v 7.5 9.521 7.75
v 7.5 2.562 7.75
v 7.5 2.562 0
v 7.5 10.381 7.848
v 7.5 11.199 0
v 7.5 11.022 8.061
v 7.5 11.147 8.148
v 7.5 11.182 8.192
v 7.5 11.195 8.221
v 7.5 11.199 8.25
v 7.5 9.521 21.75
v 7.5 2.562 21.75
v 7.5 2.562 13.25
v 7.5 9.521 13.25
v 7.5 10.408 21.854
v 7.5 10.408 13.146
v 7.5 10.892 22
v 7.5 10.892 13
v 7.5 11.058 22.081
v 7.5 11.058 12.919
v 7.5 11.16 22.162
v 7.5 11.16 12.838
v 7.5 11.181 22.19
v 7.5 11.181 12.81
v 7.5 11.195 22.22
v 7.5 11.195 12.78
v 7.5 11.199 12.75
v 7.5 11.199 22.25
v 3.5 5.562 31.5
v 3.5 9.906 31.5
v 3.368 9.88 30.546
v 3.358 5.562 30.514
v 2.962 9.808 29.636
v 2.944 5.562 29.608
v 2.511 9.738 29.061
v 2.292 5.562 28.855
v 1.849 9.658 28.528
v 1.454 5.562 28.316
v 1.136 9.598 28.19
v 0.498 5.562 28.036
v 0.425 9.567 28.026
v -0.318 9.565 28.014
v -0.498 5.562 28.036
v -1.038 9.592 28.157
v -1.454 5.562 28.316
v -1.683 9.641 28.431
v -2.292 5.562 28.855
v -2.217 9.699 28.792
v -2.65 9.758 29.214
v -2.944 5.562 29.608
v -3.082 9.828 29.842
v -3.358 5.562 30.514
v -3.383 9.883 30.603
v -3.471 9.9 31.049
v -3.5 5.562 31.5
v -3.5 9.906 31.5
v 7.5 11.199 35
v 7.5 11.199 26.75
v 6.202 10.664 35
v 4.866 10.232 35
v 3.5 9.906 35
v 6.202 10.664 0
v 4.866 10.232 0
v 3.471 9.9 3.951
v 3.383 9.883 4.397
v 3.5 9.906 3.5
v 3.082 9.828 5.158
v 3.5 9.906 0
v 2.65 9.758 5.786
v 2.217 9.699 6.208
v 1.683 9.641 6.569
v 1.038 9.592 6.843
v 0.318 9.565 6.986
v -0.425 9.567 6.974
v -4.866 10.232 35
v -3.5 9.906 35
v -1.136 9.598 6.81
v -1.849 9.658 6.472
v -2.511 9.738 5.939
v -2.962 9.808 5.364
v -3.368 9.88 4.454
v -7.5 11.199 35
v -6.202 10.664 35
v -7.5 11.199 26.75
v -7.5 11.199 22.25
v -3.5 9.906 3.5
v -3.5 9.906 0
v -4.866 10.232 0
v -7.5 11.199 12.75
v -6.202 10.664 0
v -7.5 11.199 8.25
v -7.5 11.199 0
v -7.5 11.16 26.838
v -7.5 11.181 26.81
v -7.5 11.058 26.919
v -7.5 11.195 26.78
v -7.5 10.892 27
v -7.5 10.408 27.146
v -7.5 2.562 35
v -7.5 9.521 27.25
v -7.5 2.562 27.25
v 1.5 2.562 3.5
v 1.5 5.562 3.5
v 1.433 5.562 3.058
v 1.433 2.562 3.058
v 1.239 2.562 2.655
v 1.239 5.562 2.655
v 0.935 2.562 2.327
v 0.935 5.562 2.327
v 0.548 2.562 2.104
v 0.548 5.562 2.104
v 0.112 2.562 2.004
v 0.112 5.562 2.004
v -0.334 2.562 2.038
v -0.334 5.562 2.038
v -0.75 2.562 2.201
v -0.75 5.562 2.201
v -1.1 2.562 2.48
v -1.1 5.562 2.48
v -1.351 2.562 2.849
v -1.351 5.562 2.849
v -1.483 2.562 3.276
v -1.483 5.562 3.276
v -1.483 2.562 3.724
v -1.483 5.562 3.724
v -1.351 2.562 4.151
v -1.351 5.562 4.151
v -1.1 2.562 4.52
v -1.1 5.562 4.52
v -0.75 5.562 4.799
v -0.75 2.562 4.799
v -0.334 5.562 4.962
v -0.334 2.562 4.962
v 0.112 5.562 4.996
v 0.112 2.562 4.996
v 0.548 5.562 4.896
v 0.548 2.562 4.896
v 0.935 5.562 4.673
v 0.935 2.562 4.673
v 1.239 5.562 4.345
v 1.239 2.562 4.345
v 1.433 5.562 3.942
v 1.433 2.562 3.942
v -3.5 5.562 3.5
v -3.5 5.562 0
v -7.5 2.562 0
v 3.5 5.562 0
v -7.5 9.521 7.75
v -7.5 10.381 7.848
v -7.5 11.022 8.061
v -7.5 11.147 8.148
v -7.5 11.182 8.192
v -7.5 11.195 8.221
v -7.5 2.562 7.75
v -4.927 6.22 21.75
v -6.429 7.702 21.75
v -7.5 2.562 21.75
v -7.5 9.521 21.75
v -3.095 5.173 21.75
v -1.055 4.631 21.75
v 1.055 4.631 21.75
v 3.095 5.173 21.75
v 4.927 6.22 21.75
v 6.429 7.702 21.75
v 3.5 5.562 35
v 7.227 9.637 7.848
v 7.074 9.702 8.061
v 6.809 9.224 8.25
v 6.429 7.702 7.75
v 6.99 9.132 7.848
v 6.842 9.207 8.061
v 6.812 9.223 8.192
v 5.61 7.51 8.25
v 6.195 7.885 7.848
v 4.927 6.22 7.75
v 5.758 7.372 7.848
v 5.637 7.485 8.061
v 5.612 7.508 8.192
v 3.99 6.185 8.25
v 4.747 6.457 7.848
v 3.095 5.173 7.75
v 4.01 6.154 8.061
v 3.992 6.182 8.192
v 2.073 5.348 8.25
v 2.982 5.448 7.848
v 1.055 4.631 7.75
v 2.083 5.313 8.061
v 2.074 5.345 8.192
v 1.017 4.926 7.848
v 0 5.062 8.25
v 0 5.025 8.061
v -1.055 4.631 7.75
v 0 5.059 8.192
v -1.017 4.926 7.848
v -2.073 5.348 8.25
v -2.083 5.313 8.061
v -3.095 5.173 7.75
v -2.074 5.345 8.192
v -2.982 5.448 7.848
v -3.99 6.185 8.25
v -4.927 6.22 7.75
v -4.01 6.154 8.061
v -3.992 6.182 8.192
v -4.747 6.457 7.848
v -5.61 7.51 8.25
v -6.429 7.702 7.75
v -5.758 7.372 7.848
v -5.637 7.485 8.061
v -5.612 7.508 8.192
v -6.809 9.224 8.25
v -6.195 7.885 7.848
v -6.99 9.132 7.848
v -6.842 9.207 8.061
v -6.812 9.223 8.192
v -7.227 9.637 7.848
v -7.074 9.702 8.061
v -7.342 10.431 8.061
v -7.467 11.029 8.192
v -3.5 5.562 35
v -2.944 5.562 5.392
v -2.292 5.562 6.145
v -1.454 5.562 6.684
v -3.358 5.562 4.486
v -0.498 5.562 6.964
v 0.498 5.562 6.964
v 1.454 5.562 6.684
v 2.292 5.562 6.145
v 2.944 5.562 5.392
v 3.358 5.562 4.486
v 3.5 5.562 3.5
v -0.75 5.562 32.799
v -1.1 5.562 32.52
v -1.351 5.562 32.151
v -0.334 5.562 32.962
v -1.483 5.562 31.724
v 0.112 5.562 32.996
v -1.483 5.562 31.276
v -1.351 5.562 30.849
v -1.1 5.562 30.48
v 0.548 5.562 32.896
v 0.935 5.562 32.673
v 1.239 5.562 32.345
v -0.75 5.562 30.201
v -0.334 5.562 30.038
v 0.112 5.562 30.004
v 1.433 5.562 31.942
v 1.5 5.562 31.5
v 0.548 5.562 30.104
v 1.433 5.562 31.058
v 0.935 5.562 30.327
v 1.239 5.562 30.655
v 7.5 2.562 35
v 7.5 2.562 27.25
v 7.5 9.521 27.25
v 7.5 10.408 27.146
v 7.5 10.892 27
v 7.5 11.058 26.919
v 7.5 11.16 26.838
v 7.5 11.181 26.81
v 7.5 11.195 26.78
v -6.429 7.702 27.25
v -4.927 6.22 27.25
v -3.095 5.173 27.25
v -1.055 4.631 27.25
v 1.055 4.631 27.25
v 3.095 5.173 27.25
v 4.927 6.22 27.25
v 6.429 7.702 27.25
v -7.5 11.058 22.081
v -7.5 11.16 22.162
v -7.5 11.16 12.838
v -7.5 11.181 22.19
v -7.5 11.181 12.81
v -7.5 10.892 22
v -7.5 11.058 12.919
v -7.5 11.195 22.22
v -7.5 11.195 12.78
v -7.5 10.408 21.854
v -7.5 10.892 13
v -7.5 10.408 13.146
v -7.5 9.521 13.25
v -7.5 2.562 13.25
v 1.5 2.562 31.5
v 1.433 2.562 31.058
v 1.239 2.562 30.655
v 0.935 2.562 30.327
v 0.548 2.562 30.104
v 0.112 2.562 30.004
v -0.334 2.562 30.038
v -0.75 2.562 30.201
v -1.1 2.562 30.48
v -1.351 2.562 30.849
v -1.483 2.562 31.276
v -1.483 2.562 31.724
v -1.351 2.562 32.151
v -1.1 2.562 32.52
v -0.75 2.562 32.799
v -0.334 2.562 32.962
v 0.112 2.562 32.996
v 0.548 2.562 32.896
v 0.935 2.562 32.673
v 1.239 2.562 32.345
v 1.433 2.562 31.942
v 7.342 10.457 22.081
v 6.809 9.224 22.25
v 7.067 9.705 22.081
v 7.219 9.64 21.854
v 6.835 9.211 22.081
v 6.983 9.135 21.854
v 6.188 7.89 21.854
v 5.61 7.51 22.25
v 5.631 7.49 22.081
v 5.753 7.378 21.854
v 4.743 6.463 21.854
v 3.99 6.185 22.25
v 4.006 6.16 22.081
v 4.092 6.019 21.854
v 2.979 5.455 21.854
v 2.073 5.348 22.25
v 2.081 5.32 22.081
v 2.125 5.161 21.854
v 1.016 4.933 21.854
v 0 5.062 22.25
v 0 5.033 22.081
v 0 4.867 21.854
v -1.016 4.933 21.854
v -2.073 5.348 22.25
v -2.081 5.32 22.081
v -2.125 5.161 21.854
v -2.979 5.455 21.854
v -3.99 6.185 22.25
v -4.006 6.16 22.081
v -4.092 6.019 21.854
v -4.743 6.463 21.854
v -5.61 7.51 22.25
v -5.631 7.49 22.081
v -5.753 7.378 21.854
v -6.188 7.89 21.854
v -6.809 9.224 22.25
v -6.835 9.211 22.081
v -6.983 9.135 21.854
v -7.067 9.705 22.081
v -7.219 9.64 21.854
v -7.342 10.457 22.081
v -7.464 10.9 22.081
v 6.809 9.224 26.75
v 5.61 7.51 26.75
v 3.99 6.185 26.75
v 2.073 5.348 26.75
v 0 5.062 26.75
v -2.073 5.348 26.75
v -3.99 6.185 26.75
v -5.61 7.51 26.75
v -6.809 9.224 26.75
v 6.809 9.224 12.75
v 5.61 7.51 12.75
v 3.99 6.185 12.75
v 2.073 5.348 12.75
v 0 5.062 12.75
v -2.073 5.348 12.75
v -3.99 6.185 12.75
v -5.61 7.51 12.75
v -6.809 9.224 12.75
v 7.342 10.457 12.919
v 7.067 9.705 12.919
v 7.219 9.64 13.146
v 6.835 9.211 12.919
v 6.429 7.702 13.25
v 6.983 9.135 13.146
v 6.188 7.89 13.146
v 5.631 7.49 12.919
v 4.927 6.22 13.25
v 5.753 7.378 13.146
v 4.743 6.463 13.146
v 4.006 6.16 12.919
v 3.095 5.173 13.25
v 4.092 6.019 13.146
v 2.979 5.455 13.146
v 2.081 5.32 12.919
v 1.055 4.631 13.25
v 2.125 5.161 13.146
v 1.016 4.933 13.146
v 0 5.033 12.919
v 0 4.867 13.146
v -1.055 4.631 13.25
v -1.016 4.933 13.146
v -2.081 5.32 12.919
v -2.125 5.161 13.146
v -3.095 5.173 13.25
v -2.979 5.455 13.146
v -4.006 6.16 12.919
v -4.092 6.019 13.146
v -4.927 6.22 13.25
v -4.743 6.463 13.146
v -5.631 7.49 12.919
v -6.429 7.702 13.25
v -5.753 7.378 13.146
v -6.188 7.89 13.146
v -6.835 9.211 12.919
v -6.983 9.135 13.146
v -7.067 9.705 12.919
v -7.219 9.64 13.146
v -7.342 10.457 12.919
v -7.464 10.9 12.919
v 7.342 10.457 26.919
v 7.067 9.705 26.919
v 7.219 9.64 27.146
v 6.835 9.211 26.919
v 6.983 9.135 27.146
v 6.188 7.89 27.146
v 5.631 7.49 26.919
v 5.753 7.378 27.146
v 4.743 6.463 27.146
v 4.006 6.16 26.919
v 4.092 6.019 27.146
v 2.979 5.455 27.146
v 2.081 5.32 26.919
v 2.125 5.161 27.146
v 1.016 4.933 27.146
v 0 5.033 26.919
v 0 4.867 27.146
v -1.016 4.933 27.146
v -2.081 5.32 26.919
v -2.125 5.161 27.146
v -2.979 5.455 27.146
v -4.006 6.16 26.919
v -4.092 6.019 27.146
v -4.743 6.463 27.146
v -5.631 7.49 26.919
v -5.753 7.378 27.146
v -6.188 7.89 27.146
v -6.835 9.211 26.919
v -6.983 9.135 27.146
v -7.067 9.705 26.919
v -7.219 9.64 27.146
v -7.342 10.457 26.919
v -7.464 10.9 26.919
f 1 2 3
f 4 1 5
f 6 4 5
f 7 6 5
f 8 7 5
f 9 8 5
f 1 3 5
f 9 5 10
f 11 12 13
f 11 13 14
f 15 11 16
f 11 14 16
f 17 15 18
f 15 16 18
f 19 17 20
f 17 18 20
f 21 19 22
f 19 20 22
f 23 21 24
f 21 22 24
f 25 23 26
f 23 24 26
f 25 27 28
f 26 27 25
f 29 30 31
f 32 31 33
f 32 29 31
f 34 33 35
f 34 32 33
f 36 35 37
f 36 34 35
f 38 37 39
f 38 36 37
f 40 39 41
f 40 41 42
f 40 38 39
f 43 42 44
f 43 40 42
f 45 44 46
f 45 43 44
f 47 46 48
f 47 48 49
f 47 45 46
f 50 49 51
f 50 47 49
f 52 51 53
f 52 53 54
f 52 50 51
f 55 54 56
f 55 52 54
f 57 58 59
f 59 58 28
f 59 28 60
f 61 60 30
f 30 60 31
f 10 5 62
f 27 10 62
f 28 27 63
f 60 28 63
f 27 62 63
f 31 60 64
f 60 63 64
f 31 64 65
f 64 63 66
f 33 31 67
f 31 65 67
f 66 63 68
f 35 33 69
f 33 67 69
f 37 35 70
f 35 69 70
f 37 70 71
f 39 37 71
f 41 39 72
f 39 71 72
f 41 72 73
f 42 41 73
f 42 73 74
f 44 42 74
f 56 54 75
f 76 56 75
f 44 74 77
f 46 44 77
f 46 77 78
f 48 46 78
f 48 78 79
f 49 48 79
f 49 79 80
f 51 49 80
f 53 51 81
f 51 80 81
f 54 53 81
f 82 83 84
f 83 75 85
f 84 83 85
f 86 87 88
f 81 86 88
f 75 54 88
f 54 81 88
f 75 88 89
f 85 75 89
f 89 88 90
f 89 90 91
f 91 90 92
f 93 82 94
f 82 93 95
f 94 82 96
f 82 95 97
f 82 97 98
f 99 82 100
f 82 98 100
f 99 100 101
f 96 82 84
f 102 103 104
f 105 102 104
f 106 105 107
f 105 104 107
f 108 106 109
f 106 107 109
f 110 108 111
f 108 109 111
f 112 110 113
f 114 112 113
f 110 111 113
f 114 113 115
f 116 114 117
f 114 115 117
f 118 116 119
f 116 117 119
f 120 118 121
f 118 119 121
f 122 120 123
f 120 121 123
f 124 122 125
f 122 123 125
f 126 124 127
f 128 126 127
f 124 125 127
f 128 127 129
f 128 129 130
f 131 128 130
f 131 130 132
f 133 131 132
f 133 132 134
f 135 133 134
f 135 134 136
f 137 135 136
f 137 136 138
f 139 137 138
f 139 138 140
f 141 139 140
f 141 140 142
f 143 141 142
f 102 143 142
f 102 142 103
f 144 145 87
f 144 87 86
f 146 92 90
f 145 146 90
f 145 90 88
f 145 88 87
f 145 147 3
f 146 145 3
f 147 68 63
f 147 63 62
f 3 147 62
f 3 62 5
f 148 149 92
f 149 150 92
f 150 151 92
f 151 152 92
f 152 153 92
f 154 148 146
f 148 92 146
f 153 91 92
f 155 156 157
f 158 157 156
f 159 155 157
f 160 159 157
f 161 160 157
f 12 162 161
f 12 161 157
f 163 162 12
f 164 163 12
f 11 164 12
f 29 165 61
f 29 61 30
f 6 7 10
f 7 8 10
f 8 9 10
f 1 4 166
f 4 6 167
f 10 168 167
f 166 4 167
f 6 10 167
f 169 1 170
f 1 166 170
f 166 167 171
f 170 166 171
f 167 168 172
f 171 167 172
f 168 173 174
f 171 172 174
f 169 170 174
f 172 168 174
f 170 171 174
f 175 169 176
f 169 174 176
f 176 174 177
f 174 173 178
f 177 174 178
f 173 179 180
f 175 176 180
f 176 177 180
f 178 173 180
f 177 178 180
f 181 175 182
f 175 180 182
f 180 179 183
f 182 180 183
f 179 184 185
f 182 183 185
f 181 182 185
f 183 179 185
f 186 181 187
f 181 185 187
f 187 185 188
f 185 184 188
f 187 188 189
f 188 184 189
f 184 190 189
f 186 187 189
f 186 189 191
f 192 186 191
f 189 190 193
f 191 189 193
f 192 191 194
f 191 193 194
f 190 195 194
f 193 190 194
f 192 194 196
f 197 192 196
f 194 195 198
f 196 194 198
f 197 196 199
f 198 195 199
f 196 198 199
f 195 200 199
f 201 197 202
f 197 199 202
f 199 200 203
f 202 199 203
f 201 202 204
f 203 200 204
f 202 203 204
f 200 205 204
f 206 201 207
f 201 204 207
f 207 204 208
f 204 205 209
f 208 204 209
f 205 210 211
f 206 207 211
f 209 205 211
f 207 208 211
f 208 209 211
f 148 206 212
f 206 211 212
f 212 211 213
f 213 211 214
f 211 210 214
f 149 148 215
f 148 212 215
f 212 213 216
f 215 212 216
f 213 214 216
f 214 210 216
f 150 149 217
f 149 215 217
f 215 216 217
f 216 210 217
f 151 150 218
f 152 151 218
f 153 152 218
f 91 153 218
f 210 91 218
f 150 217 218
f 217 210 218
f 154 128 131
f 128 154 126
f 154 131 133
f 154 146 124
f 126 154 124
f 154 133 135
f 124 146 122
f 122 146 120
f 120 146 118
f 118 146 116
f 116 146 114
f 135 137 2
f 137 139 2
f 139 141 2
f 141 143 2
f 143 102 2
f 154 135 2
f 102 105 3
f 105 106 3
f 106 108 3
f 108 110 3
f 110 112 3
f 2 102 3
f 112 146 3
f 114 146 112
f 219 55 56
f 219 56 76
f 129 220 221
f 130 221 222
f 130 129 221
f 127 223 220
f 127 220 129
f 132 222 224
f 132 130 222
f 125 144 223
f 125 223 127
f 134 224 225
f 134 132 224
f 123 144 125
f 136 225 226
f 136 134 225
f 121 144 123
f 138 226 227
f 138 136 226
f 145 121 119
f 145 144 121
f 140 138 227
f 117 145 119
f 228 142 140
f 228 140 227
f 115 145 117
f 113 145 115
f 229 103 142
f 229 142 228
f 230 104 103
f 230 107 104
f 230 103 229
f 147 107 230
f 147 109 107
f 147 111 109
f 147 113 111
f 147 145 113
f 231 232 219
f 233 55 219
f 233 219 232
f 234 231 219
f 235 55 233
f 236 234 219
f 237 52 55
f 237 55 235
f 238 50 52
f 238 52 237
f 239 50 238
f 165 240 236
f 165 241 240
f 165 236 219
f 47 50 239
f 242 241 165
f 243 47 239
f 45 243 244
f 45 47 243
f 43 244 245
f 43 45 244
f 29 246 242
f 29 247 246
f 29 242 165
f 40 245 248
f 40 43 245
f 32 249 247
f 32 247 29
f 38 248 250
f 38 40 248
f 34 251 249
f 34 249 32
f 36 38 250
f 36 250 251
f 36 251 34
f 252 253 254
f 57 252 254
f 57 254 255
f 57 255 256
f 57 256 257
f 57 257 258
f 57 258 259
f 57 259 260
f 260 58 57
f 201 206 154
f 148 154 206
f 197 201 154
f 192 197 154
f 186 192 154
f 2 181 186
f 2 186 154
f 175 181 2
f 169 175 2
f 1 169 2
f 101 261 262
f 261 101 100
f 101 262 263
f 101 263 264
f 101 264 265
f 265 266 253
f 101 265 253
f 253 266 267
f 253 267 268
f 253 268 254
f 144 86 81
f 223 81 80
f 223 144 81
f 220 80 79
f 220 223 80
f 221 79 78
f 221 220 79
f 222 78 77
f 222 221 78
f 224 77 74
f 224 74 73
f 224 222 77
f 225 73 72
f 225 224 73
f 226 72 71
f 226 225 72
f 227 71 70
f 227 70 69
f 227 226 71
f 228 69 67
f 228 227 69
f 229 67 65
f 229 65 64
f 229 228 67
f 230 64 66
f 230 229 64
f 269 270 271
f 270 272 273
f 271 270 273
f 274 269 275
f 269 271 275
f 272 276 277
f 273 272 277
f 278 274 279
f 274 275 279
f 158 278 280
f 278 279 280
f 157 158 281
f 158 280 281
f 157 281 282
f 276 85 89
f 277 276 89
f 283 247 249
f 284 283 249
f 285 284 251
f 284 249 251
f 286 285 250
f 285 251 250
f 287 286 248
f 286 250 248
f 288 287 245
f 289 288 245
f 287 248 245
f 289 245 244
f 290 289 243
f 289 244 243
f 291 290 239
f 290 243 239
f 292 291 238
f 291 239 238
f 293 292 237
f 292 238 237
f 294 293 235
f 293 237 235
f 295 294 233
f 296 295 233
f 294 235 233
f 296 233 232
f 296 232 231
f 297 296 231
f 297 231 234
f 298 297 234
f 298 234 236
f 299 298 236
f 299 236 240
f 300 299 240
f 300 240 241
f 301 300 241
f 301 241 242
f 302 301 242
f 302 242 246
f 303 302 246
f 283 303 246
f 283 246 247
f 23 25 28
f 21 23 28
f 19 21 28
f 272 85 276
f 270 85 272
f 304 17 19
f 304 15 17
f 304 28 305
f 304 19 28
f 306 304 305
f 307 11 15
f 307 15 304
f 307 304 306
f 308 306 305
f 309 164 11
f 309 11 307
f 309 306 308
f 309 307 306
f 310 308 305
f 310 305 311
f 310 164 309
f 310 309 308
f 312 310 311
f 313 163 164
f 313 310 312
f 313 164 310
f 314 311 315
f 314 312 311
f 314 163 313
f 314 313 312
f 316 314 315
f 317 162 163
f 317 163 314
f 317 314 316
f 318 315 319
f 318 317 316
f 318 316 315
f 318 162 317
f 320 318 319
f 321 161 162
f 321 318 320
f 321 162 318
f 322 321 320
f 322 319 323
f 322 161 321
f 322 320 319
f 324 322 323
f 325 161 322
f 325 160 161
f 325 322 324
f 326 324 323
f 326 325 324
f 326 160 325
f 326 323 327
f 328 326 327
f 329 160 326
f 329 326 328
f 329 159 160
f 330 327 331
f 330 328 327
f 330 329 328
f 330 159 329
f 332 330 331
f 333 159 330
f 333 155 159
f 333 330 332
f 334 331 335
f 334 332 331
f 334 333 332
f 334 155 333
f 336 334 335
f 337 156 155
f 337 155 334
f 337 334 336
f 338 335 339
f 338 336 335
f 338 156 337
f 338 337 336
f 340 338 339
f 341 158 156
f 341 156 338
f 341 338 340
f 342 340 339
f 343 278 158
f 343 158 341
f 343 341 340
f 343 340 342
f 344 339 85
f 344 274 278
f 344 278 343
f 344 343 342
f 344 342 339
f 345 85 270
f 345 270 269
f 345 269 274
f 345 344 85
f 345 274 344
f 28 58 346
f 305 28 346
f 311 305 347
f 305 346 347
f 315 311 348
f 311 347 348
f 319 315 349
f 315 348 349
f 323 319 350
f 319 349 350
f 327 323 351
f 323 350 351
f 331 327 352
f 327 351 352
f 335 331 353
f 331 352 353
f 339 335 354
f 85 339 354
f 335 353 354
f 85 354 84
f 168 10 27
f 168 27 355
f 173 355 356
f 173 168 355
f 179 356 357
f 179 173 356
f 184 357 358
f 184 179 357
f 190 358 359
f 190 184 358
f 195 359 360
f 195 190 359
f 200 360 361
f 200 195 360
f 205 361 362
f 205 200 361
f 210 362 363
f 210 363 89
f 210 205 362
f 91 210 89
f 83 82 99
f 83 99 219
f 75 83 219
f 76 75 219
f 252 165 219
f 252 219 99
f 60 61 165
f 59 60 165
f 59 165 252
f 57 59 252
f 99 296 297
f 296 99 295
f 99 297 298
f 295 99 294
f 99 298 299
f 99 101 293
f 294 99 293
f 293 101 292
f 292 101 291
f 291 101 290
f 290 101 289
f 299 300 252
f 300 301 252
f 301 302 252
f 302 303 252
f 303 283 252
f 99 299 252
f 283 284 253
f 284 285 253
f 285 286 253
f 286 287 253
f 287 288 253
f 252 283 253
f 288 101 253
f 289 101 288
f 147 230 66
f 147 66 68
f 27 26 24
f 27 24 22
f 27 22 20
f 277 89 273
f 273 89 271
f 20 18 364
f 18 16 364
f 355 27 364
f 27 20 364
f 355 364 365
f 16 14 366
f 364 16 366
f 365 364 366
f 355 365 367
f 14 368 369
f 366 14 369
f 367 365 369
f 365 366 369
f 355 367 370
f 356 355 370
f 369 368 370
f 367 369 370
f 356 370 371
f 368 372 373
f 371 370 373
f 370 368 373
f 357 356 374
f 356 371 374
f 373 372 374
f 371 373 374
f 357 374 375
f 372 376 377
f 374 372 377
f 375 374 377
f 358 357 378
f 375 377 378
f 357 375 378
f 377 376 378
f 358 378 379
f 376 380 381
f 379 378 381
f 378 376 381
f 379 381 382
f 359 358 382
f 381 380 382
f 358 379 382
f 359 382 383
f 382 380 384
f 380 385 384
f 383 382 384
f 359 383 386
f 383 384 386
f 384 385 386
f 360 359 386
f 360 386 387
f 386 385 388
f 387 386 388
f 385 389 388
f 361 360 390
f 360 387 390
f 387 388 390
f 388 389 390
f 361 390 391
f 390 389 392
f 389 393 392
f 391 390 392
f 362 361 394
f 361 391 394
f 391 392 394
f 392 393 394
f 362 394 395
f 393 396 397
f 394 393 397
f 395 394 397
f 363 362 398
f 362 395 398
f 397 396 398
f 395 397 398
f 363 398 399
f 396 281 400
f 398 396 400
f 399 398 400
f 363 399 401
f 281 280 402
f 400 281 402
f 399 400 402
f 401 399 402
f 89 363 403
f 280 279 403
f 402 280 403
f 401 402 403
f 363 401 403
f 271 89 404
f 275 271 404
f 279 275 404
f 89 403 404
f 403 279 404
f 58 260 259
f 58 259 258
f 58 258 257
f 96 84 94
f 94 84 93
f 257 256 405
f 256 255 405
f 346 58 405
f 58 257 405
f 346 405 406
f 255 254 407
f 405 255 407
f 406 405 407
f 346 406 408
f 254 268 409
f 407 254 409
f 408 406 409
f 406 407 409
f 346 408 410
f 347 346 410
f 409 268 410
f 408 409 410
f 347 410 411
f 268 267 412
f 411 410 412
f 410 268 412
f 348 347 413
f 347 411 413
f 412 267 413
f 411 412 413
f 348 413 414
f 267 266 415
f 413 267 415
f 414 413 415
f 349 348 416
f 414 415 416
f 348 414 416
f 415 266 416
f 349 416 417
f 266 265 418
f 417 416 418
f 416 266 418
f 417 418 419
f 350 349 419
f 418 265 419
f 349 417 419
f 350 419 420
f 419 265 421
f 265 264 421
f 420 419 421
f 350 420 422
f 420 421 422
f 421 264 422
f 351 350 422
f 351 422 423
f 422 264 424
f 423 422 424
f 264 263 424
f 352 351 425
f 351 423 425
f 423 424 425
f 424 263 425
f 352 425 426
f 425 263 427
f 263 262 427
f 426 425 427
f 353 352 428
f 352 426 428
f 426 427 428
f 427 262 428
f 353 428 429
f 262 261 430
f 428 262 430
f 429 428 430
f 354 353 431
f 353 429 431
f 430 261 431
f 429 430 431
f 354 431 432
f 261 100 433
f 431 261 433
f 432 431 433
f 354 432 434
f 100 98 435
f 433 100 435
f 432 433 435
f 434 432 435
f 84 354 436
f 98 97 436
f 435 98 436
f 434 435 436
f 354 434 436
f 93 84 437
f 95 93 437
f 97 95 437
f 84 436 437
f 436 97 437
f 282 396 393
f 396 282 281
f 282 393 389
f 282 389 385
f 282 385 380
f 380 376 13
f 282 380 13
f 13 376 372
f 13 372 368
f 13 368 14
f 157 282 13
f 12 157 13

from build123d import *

# Parameters (mm, degrees)
BOSS_EXTRUDE1_DEPTH = 35
CUT_EXTRUDE1_DEPTH  = 30
CUT_EXTRUDE3_DEPTH  = 5.5
CUT_EXTRUDE4_DEPTH  = 5.5
SKETCH7_R           = 1.5
CUT_EXTRUDE5_DEPTH  = 4
FILLET1_R           = 0.5


with BuildPart() as part:
    # Sketch1 → Boss-Extrude1 (new body)
    with BuildSketch(Plane.XY):
        with BuildLine():
            Line((-7.5, 2.562310746), (7.5, 2.562310746))
            Line((7.5, 2.562310746), (7.5, 11.199242574))
            ThreePointArc((7.5, 11.199242574), (0, 9.562310746), (-7.5, 11.199242574))
            Line((-7.5, 11.199242574), (-7.5, 2.562310746))
        make_face()
    extrude(amount=BOSS_EXTRUDE1_DEPTH)

    # Sketch3 → Cut-Extrude1 (cut)
    with BuildSketch(Plane(origin=(0, 5.562310746, 0), x_dir=(-1, 0, 0), z_dir=(0, -1, 0))):
        with BuildLine():
            Line((-3.5, -3.5), (-3.5, 2.919890279))
            Line((-3.5, 2.919890279), (3.5, 2.919890279))
            Line((3.5, 2.919890279), (3.5, -3.5))
            ThreePointArc((3.5, -3.5), (0, -7), (-3.5, -3.5))
        make_face()
        with BuildLine():
            Line((3.5, -31.5), (3.5, -38.189637839))
            Line((3.5, -38.189637839), (-3.5, -38.189637839))
            Line((-3.5, -38.189637839), (-3.5, -31.5))
            ThreePointArc((-3.5, -31.5), (0, -28), (3.5, -31.5))
        make_face()
    extrude(amount=-CUT_EXTRUDE1_DEPTH, mode=Mode.SUBTRACT)

    # Sketch5 → Cut-Extrude3 (cut)
    with BuildSketch(Plane.XY.offset(7.75)):
        with BuildLine():
            Line((-7.5, 11.199242574), (-7.5, 2.562310746))
            Line((-7.5, 2.562310746), (7.5, 2.562310746))
            Line((7.5, 2.562310746), (7.5, 11.199242574))
            ThreePointArc((7.5, 11.199242574), (0, 5.062310746), (-7.5, 11.199242574))
        make_face()
    extrude(amount=CUT_EXTRUDE3_DEPTH, mode=Mode.SUBTRACT)

    # Sketch6 → Cut-Extrude4 (cut)
    with BuildSketch(Plane.XY.offset(27.25)):
        with BuildLine():
            Line((-7.5, 11.199242574), (-7.5, 2.562310746))
            Line((-7.5, 2.562310746), (7.5, 2.562310746))
            Line((7.5, 2.562310746), (7.5, 11.199242574))
            ThreePointArc((7.5, 11.199242574), (0, 5.062310746), (-7.5, 11.199242574))
        make_face()
    extrude(amount=-CUT_EXTRUDE4_DEPTH, mode=Mode.SUBTRACT)

    # Sketch7 → Cut-Extrude5 (cut, through all)
    with BuildSketch(Plane(origin=(0, 5.562310746, 0), x_dir=(1, 0, 0), z_dir=(0, 1, 0))):
        with Locations((0, -3.5)):
            Circle(SKETCH7_R)
        with Locations((0, -31.5)):
            Circle(SKETCH7_R)
    extrude(amount=-CUT_EXTRUDE5_DEPTH, mode=Mode.SUBTRACT)

    # Fillet1
    fillet1_edges = [part.edges().sort_by_distance(p)[0] for p in [
        (0, 5.062310746, 7.75),
        (0, 5.062310746, 13.25),
        (0, 5.062310746, 21.75),
        (0, 5.062310746, 27.25),
    ]]
    fillet(fillet1_edges, radius=FILLET1_R)


solid = part.part
